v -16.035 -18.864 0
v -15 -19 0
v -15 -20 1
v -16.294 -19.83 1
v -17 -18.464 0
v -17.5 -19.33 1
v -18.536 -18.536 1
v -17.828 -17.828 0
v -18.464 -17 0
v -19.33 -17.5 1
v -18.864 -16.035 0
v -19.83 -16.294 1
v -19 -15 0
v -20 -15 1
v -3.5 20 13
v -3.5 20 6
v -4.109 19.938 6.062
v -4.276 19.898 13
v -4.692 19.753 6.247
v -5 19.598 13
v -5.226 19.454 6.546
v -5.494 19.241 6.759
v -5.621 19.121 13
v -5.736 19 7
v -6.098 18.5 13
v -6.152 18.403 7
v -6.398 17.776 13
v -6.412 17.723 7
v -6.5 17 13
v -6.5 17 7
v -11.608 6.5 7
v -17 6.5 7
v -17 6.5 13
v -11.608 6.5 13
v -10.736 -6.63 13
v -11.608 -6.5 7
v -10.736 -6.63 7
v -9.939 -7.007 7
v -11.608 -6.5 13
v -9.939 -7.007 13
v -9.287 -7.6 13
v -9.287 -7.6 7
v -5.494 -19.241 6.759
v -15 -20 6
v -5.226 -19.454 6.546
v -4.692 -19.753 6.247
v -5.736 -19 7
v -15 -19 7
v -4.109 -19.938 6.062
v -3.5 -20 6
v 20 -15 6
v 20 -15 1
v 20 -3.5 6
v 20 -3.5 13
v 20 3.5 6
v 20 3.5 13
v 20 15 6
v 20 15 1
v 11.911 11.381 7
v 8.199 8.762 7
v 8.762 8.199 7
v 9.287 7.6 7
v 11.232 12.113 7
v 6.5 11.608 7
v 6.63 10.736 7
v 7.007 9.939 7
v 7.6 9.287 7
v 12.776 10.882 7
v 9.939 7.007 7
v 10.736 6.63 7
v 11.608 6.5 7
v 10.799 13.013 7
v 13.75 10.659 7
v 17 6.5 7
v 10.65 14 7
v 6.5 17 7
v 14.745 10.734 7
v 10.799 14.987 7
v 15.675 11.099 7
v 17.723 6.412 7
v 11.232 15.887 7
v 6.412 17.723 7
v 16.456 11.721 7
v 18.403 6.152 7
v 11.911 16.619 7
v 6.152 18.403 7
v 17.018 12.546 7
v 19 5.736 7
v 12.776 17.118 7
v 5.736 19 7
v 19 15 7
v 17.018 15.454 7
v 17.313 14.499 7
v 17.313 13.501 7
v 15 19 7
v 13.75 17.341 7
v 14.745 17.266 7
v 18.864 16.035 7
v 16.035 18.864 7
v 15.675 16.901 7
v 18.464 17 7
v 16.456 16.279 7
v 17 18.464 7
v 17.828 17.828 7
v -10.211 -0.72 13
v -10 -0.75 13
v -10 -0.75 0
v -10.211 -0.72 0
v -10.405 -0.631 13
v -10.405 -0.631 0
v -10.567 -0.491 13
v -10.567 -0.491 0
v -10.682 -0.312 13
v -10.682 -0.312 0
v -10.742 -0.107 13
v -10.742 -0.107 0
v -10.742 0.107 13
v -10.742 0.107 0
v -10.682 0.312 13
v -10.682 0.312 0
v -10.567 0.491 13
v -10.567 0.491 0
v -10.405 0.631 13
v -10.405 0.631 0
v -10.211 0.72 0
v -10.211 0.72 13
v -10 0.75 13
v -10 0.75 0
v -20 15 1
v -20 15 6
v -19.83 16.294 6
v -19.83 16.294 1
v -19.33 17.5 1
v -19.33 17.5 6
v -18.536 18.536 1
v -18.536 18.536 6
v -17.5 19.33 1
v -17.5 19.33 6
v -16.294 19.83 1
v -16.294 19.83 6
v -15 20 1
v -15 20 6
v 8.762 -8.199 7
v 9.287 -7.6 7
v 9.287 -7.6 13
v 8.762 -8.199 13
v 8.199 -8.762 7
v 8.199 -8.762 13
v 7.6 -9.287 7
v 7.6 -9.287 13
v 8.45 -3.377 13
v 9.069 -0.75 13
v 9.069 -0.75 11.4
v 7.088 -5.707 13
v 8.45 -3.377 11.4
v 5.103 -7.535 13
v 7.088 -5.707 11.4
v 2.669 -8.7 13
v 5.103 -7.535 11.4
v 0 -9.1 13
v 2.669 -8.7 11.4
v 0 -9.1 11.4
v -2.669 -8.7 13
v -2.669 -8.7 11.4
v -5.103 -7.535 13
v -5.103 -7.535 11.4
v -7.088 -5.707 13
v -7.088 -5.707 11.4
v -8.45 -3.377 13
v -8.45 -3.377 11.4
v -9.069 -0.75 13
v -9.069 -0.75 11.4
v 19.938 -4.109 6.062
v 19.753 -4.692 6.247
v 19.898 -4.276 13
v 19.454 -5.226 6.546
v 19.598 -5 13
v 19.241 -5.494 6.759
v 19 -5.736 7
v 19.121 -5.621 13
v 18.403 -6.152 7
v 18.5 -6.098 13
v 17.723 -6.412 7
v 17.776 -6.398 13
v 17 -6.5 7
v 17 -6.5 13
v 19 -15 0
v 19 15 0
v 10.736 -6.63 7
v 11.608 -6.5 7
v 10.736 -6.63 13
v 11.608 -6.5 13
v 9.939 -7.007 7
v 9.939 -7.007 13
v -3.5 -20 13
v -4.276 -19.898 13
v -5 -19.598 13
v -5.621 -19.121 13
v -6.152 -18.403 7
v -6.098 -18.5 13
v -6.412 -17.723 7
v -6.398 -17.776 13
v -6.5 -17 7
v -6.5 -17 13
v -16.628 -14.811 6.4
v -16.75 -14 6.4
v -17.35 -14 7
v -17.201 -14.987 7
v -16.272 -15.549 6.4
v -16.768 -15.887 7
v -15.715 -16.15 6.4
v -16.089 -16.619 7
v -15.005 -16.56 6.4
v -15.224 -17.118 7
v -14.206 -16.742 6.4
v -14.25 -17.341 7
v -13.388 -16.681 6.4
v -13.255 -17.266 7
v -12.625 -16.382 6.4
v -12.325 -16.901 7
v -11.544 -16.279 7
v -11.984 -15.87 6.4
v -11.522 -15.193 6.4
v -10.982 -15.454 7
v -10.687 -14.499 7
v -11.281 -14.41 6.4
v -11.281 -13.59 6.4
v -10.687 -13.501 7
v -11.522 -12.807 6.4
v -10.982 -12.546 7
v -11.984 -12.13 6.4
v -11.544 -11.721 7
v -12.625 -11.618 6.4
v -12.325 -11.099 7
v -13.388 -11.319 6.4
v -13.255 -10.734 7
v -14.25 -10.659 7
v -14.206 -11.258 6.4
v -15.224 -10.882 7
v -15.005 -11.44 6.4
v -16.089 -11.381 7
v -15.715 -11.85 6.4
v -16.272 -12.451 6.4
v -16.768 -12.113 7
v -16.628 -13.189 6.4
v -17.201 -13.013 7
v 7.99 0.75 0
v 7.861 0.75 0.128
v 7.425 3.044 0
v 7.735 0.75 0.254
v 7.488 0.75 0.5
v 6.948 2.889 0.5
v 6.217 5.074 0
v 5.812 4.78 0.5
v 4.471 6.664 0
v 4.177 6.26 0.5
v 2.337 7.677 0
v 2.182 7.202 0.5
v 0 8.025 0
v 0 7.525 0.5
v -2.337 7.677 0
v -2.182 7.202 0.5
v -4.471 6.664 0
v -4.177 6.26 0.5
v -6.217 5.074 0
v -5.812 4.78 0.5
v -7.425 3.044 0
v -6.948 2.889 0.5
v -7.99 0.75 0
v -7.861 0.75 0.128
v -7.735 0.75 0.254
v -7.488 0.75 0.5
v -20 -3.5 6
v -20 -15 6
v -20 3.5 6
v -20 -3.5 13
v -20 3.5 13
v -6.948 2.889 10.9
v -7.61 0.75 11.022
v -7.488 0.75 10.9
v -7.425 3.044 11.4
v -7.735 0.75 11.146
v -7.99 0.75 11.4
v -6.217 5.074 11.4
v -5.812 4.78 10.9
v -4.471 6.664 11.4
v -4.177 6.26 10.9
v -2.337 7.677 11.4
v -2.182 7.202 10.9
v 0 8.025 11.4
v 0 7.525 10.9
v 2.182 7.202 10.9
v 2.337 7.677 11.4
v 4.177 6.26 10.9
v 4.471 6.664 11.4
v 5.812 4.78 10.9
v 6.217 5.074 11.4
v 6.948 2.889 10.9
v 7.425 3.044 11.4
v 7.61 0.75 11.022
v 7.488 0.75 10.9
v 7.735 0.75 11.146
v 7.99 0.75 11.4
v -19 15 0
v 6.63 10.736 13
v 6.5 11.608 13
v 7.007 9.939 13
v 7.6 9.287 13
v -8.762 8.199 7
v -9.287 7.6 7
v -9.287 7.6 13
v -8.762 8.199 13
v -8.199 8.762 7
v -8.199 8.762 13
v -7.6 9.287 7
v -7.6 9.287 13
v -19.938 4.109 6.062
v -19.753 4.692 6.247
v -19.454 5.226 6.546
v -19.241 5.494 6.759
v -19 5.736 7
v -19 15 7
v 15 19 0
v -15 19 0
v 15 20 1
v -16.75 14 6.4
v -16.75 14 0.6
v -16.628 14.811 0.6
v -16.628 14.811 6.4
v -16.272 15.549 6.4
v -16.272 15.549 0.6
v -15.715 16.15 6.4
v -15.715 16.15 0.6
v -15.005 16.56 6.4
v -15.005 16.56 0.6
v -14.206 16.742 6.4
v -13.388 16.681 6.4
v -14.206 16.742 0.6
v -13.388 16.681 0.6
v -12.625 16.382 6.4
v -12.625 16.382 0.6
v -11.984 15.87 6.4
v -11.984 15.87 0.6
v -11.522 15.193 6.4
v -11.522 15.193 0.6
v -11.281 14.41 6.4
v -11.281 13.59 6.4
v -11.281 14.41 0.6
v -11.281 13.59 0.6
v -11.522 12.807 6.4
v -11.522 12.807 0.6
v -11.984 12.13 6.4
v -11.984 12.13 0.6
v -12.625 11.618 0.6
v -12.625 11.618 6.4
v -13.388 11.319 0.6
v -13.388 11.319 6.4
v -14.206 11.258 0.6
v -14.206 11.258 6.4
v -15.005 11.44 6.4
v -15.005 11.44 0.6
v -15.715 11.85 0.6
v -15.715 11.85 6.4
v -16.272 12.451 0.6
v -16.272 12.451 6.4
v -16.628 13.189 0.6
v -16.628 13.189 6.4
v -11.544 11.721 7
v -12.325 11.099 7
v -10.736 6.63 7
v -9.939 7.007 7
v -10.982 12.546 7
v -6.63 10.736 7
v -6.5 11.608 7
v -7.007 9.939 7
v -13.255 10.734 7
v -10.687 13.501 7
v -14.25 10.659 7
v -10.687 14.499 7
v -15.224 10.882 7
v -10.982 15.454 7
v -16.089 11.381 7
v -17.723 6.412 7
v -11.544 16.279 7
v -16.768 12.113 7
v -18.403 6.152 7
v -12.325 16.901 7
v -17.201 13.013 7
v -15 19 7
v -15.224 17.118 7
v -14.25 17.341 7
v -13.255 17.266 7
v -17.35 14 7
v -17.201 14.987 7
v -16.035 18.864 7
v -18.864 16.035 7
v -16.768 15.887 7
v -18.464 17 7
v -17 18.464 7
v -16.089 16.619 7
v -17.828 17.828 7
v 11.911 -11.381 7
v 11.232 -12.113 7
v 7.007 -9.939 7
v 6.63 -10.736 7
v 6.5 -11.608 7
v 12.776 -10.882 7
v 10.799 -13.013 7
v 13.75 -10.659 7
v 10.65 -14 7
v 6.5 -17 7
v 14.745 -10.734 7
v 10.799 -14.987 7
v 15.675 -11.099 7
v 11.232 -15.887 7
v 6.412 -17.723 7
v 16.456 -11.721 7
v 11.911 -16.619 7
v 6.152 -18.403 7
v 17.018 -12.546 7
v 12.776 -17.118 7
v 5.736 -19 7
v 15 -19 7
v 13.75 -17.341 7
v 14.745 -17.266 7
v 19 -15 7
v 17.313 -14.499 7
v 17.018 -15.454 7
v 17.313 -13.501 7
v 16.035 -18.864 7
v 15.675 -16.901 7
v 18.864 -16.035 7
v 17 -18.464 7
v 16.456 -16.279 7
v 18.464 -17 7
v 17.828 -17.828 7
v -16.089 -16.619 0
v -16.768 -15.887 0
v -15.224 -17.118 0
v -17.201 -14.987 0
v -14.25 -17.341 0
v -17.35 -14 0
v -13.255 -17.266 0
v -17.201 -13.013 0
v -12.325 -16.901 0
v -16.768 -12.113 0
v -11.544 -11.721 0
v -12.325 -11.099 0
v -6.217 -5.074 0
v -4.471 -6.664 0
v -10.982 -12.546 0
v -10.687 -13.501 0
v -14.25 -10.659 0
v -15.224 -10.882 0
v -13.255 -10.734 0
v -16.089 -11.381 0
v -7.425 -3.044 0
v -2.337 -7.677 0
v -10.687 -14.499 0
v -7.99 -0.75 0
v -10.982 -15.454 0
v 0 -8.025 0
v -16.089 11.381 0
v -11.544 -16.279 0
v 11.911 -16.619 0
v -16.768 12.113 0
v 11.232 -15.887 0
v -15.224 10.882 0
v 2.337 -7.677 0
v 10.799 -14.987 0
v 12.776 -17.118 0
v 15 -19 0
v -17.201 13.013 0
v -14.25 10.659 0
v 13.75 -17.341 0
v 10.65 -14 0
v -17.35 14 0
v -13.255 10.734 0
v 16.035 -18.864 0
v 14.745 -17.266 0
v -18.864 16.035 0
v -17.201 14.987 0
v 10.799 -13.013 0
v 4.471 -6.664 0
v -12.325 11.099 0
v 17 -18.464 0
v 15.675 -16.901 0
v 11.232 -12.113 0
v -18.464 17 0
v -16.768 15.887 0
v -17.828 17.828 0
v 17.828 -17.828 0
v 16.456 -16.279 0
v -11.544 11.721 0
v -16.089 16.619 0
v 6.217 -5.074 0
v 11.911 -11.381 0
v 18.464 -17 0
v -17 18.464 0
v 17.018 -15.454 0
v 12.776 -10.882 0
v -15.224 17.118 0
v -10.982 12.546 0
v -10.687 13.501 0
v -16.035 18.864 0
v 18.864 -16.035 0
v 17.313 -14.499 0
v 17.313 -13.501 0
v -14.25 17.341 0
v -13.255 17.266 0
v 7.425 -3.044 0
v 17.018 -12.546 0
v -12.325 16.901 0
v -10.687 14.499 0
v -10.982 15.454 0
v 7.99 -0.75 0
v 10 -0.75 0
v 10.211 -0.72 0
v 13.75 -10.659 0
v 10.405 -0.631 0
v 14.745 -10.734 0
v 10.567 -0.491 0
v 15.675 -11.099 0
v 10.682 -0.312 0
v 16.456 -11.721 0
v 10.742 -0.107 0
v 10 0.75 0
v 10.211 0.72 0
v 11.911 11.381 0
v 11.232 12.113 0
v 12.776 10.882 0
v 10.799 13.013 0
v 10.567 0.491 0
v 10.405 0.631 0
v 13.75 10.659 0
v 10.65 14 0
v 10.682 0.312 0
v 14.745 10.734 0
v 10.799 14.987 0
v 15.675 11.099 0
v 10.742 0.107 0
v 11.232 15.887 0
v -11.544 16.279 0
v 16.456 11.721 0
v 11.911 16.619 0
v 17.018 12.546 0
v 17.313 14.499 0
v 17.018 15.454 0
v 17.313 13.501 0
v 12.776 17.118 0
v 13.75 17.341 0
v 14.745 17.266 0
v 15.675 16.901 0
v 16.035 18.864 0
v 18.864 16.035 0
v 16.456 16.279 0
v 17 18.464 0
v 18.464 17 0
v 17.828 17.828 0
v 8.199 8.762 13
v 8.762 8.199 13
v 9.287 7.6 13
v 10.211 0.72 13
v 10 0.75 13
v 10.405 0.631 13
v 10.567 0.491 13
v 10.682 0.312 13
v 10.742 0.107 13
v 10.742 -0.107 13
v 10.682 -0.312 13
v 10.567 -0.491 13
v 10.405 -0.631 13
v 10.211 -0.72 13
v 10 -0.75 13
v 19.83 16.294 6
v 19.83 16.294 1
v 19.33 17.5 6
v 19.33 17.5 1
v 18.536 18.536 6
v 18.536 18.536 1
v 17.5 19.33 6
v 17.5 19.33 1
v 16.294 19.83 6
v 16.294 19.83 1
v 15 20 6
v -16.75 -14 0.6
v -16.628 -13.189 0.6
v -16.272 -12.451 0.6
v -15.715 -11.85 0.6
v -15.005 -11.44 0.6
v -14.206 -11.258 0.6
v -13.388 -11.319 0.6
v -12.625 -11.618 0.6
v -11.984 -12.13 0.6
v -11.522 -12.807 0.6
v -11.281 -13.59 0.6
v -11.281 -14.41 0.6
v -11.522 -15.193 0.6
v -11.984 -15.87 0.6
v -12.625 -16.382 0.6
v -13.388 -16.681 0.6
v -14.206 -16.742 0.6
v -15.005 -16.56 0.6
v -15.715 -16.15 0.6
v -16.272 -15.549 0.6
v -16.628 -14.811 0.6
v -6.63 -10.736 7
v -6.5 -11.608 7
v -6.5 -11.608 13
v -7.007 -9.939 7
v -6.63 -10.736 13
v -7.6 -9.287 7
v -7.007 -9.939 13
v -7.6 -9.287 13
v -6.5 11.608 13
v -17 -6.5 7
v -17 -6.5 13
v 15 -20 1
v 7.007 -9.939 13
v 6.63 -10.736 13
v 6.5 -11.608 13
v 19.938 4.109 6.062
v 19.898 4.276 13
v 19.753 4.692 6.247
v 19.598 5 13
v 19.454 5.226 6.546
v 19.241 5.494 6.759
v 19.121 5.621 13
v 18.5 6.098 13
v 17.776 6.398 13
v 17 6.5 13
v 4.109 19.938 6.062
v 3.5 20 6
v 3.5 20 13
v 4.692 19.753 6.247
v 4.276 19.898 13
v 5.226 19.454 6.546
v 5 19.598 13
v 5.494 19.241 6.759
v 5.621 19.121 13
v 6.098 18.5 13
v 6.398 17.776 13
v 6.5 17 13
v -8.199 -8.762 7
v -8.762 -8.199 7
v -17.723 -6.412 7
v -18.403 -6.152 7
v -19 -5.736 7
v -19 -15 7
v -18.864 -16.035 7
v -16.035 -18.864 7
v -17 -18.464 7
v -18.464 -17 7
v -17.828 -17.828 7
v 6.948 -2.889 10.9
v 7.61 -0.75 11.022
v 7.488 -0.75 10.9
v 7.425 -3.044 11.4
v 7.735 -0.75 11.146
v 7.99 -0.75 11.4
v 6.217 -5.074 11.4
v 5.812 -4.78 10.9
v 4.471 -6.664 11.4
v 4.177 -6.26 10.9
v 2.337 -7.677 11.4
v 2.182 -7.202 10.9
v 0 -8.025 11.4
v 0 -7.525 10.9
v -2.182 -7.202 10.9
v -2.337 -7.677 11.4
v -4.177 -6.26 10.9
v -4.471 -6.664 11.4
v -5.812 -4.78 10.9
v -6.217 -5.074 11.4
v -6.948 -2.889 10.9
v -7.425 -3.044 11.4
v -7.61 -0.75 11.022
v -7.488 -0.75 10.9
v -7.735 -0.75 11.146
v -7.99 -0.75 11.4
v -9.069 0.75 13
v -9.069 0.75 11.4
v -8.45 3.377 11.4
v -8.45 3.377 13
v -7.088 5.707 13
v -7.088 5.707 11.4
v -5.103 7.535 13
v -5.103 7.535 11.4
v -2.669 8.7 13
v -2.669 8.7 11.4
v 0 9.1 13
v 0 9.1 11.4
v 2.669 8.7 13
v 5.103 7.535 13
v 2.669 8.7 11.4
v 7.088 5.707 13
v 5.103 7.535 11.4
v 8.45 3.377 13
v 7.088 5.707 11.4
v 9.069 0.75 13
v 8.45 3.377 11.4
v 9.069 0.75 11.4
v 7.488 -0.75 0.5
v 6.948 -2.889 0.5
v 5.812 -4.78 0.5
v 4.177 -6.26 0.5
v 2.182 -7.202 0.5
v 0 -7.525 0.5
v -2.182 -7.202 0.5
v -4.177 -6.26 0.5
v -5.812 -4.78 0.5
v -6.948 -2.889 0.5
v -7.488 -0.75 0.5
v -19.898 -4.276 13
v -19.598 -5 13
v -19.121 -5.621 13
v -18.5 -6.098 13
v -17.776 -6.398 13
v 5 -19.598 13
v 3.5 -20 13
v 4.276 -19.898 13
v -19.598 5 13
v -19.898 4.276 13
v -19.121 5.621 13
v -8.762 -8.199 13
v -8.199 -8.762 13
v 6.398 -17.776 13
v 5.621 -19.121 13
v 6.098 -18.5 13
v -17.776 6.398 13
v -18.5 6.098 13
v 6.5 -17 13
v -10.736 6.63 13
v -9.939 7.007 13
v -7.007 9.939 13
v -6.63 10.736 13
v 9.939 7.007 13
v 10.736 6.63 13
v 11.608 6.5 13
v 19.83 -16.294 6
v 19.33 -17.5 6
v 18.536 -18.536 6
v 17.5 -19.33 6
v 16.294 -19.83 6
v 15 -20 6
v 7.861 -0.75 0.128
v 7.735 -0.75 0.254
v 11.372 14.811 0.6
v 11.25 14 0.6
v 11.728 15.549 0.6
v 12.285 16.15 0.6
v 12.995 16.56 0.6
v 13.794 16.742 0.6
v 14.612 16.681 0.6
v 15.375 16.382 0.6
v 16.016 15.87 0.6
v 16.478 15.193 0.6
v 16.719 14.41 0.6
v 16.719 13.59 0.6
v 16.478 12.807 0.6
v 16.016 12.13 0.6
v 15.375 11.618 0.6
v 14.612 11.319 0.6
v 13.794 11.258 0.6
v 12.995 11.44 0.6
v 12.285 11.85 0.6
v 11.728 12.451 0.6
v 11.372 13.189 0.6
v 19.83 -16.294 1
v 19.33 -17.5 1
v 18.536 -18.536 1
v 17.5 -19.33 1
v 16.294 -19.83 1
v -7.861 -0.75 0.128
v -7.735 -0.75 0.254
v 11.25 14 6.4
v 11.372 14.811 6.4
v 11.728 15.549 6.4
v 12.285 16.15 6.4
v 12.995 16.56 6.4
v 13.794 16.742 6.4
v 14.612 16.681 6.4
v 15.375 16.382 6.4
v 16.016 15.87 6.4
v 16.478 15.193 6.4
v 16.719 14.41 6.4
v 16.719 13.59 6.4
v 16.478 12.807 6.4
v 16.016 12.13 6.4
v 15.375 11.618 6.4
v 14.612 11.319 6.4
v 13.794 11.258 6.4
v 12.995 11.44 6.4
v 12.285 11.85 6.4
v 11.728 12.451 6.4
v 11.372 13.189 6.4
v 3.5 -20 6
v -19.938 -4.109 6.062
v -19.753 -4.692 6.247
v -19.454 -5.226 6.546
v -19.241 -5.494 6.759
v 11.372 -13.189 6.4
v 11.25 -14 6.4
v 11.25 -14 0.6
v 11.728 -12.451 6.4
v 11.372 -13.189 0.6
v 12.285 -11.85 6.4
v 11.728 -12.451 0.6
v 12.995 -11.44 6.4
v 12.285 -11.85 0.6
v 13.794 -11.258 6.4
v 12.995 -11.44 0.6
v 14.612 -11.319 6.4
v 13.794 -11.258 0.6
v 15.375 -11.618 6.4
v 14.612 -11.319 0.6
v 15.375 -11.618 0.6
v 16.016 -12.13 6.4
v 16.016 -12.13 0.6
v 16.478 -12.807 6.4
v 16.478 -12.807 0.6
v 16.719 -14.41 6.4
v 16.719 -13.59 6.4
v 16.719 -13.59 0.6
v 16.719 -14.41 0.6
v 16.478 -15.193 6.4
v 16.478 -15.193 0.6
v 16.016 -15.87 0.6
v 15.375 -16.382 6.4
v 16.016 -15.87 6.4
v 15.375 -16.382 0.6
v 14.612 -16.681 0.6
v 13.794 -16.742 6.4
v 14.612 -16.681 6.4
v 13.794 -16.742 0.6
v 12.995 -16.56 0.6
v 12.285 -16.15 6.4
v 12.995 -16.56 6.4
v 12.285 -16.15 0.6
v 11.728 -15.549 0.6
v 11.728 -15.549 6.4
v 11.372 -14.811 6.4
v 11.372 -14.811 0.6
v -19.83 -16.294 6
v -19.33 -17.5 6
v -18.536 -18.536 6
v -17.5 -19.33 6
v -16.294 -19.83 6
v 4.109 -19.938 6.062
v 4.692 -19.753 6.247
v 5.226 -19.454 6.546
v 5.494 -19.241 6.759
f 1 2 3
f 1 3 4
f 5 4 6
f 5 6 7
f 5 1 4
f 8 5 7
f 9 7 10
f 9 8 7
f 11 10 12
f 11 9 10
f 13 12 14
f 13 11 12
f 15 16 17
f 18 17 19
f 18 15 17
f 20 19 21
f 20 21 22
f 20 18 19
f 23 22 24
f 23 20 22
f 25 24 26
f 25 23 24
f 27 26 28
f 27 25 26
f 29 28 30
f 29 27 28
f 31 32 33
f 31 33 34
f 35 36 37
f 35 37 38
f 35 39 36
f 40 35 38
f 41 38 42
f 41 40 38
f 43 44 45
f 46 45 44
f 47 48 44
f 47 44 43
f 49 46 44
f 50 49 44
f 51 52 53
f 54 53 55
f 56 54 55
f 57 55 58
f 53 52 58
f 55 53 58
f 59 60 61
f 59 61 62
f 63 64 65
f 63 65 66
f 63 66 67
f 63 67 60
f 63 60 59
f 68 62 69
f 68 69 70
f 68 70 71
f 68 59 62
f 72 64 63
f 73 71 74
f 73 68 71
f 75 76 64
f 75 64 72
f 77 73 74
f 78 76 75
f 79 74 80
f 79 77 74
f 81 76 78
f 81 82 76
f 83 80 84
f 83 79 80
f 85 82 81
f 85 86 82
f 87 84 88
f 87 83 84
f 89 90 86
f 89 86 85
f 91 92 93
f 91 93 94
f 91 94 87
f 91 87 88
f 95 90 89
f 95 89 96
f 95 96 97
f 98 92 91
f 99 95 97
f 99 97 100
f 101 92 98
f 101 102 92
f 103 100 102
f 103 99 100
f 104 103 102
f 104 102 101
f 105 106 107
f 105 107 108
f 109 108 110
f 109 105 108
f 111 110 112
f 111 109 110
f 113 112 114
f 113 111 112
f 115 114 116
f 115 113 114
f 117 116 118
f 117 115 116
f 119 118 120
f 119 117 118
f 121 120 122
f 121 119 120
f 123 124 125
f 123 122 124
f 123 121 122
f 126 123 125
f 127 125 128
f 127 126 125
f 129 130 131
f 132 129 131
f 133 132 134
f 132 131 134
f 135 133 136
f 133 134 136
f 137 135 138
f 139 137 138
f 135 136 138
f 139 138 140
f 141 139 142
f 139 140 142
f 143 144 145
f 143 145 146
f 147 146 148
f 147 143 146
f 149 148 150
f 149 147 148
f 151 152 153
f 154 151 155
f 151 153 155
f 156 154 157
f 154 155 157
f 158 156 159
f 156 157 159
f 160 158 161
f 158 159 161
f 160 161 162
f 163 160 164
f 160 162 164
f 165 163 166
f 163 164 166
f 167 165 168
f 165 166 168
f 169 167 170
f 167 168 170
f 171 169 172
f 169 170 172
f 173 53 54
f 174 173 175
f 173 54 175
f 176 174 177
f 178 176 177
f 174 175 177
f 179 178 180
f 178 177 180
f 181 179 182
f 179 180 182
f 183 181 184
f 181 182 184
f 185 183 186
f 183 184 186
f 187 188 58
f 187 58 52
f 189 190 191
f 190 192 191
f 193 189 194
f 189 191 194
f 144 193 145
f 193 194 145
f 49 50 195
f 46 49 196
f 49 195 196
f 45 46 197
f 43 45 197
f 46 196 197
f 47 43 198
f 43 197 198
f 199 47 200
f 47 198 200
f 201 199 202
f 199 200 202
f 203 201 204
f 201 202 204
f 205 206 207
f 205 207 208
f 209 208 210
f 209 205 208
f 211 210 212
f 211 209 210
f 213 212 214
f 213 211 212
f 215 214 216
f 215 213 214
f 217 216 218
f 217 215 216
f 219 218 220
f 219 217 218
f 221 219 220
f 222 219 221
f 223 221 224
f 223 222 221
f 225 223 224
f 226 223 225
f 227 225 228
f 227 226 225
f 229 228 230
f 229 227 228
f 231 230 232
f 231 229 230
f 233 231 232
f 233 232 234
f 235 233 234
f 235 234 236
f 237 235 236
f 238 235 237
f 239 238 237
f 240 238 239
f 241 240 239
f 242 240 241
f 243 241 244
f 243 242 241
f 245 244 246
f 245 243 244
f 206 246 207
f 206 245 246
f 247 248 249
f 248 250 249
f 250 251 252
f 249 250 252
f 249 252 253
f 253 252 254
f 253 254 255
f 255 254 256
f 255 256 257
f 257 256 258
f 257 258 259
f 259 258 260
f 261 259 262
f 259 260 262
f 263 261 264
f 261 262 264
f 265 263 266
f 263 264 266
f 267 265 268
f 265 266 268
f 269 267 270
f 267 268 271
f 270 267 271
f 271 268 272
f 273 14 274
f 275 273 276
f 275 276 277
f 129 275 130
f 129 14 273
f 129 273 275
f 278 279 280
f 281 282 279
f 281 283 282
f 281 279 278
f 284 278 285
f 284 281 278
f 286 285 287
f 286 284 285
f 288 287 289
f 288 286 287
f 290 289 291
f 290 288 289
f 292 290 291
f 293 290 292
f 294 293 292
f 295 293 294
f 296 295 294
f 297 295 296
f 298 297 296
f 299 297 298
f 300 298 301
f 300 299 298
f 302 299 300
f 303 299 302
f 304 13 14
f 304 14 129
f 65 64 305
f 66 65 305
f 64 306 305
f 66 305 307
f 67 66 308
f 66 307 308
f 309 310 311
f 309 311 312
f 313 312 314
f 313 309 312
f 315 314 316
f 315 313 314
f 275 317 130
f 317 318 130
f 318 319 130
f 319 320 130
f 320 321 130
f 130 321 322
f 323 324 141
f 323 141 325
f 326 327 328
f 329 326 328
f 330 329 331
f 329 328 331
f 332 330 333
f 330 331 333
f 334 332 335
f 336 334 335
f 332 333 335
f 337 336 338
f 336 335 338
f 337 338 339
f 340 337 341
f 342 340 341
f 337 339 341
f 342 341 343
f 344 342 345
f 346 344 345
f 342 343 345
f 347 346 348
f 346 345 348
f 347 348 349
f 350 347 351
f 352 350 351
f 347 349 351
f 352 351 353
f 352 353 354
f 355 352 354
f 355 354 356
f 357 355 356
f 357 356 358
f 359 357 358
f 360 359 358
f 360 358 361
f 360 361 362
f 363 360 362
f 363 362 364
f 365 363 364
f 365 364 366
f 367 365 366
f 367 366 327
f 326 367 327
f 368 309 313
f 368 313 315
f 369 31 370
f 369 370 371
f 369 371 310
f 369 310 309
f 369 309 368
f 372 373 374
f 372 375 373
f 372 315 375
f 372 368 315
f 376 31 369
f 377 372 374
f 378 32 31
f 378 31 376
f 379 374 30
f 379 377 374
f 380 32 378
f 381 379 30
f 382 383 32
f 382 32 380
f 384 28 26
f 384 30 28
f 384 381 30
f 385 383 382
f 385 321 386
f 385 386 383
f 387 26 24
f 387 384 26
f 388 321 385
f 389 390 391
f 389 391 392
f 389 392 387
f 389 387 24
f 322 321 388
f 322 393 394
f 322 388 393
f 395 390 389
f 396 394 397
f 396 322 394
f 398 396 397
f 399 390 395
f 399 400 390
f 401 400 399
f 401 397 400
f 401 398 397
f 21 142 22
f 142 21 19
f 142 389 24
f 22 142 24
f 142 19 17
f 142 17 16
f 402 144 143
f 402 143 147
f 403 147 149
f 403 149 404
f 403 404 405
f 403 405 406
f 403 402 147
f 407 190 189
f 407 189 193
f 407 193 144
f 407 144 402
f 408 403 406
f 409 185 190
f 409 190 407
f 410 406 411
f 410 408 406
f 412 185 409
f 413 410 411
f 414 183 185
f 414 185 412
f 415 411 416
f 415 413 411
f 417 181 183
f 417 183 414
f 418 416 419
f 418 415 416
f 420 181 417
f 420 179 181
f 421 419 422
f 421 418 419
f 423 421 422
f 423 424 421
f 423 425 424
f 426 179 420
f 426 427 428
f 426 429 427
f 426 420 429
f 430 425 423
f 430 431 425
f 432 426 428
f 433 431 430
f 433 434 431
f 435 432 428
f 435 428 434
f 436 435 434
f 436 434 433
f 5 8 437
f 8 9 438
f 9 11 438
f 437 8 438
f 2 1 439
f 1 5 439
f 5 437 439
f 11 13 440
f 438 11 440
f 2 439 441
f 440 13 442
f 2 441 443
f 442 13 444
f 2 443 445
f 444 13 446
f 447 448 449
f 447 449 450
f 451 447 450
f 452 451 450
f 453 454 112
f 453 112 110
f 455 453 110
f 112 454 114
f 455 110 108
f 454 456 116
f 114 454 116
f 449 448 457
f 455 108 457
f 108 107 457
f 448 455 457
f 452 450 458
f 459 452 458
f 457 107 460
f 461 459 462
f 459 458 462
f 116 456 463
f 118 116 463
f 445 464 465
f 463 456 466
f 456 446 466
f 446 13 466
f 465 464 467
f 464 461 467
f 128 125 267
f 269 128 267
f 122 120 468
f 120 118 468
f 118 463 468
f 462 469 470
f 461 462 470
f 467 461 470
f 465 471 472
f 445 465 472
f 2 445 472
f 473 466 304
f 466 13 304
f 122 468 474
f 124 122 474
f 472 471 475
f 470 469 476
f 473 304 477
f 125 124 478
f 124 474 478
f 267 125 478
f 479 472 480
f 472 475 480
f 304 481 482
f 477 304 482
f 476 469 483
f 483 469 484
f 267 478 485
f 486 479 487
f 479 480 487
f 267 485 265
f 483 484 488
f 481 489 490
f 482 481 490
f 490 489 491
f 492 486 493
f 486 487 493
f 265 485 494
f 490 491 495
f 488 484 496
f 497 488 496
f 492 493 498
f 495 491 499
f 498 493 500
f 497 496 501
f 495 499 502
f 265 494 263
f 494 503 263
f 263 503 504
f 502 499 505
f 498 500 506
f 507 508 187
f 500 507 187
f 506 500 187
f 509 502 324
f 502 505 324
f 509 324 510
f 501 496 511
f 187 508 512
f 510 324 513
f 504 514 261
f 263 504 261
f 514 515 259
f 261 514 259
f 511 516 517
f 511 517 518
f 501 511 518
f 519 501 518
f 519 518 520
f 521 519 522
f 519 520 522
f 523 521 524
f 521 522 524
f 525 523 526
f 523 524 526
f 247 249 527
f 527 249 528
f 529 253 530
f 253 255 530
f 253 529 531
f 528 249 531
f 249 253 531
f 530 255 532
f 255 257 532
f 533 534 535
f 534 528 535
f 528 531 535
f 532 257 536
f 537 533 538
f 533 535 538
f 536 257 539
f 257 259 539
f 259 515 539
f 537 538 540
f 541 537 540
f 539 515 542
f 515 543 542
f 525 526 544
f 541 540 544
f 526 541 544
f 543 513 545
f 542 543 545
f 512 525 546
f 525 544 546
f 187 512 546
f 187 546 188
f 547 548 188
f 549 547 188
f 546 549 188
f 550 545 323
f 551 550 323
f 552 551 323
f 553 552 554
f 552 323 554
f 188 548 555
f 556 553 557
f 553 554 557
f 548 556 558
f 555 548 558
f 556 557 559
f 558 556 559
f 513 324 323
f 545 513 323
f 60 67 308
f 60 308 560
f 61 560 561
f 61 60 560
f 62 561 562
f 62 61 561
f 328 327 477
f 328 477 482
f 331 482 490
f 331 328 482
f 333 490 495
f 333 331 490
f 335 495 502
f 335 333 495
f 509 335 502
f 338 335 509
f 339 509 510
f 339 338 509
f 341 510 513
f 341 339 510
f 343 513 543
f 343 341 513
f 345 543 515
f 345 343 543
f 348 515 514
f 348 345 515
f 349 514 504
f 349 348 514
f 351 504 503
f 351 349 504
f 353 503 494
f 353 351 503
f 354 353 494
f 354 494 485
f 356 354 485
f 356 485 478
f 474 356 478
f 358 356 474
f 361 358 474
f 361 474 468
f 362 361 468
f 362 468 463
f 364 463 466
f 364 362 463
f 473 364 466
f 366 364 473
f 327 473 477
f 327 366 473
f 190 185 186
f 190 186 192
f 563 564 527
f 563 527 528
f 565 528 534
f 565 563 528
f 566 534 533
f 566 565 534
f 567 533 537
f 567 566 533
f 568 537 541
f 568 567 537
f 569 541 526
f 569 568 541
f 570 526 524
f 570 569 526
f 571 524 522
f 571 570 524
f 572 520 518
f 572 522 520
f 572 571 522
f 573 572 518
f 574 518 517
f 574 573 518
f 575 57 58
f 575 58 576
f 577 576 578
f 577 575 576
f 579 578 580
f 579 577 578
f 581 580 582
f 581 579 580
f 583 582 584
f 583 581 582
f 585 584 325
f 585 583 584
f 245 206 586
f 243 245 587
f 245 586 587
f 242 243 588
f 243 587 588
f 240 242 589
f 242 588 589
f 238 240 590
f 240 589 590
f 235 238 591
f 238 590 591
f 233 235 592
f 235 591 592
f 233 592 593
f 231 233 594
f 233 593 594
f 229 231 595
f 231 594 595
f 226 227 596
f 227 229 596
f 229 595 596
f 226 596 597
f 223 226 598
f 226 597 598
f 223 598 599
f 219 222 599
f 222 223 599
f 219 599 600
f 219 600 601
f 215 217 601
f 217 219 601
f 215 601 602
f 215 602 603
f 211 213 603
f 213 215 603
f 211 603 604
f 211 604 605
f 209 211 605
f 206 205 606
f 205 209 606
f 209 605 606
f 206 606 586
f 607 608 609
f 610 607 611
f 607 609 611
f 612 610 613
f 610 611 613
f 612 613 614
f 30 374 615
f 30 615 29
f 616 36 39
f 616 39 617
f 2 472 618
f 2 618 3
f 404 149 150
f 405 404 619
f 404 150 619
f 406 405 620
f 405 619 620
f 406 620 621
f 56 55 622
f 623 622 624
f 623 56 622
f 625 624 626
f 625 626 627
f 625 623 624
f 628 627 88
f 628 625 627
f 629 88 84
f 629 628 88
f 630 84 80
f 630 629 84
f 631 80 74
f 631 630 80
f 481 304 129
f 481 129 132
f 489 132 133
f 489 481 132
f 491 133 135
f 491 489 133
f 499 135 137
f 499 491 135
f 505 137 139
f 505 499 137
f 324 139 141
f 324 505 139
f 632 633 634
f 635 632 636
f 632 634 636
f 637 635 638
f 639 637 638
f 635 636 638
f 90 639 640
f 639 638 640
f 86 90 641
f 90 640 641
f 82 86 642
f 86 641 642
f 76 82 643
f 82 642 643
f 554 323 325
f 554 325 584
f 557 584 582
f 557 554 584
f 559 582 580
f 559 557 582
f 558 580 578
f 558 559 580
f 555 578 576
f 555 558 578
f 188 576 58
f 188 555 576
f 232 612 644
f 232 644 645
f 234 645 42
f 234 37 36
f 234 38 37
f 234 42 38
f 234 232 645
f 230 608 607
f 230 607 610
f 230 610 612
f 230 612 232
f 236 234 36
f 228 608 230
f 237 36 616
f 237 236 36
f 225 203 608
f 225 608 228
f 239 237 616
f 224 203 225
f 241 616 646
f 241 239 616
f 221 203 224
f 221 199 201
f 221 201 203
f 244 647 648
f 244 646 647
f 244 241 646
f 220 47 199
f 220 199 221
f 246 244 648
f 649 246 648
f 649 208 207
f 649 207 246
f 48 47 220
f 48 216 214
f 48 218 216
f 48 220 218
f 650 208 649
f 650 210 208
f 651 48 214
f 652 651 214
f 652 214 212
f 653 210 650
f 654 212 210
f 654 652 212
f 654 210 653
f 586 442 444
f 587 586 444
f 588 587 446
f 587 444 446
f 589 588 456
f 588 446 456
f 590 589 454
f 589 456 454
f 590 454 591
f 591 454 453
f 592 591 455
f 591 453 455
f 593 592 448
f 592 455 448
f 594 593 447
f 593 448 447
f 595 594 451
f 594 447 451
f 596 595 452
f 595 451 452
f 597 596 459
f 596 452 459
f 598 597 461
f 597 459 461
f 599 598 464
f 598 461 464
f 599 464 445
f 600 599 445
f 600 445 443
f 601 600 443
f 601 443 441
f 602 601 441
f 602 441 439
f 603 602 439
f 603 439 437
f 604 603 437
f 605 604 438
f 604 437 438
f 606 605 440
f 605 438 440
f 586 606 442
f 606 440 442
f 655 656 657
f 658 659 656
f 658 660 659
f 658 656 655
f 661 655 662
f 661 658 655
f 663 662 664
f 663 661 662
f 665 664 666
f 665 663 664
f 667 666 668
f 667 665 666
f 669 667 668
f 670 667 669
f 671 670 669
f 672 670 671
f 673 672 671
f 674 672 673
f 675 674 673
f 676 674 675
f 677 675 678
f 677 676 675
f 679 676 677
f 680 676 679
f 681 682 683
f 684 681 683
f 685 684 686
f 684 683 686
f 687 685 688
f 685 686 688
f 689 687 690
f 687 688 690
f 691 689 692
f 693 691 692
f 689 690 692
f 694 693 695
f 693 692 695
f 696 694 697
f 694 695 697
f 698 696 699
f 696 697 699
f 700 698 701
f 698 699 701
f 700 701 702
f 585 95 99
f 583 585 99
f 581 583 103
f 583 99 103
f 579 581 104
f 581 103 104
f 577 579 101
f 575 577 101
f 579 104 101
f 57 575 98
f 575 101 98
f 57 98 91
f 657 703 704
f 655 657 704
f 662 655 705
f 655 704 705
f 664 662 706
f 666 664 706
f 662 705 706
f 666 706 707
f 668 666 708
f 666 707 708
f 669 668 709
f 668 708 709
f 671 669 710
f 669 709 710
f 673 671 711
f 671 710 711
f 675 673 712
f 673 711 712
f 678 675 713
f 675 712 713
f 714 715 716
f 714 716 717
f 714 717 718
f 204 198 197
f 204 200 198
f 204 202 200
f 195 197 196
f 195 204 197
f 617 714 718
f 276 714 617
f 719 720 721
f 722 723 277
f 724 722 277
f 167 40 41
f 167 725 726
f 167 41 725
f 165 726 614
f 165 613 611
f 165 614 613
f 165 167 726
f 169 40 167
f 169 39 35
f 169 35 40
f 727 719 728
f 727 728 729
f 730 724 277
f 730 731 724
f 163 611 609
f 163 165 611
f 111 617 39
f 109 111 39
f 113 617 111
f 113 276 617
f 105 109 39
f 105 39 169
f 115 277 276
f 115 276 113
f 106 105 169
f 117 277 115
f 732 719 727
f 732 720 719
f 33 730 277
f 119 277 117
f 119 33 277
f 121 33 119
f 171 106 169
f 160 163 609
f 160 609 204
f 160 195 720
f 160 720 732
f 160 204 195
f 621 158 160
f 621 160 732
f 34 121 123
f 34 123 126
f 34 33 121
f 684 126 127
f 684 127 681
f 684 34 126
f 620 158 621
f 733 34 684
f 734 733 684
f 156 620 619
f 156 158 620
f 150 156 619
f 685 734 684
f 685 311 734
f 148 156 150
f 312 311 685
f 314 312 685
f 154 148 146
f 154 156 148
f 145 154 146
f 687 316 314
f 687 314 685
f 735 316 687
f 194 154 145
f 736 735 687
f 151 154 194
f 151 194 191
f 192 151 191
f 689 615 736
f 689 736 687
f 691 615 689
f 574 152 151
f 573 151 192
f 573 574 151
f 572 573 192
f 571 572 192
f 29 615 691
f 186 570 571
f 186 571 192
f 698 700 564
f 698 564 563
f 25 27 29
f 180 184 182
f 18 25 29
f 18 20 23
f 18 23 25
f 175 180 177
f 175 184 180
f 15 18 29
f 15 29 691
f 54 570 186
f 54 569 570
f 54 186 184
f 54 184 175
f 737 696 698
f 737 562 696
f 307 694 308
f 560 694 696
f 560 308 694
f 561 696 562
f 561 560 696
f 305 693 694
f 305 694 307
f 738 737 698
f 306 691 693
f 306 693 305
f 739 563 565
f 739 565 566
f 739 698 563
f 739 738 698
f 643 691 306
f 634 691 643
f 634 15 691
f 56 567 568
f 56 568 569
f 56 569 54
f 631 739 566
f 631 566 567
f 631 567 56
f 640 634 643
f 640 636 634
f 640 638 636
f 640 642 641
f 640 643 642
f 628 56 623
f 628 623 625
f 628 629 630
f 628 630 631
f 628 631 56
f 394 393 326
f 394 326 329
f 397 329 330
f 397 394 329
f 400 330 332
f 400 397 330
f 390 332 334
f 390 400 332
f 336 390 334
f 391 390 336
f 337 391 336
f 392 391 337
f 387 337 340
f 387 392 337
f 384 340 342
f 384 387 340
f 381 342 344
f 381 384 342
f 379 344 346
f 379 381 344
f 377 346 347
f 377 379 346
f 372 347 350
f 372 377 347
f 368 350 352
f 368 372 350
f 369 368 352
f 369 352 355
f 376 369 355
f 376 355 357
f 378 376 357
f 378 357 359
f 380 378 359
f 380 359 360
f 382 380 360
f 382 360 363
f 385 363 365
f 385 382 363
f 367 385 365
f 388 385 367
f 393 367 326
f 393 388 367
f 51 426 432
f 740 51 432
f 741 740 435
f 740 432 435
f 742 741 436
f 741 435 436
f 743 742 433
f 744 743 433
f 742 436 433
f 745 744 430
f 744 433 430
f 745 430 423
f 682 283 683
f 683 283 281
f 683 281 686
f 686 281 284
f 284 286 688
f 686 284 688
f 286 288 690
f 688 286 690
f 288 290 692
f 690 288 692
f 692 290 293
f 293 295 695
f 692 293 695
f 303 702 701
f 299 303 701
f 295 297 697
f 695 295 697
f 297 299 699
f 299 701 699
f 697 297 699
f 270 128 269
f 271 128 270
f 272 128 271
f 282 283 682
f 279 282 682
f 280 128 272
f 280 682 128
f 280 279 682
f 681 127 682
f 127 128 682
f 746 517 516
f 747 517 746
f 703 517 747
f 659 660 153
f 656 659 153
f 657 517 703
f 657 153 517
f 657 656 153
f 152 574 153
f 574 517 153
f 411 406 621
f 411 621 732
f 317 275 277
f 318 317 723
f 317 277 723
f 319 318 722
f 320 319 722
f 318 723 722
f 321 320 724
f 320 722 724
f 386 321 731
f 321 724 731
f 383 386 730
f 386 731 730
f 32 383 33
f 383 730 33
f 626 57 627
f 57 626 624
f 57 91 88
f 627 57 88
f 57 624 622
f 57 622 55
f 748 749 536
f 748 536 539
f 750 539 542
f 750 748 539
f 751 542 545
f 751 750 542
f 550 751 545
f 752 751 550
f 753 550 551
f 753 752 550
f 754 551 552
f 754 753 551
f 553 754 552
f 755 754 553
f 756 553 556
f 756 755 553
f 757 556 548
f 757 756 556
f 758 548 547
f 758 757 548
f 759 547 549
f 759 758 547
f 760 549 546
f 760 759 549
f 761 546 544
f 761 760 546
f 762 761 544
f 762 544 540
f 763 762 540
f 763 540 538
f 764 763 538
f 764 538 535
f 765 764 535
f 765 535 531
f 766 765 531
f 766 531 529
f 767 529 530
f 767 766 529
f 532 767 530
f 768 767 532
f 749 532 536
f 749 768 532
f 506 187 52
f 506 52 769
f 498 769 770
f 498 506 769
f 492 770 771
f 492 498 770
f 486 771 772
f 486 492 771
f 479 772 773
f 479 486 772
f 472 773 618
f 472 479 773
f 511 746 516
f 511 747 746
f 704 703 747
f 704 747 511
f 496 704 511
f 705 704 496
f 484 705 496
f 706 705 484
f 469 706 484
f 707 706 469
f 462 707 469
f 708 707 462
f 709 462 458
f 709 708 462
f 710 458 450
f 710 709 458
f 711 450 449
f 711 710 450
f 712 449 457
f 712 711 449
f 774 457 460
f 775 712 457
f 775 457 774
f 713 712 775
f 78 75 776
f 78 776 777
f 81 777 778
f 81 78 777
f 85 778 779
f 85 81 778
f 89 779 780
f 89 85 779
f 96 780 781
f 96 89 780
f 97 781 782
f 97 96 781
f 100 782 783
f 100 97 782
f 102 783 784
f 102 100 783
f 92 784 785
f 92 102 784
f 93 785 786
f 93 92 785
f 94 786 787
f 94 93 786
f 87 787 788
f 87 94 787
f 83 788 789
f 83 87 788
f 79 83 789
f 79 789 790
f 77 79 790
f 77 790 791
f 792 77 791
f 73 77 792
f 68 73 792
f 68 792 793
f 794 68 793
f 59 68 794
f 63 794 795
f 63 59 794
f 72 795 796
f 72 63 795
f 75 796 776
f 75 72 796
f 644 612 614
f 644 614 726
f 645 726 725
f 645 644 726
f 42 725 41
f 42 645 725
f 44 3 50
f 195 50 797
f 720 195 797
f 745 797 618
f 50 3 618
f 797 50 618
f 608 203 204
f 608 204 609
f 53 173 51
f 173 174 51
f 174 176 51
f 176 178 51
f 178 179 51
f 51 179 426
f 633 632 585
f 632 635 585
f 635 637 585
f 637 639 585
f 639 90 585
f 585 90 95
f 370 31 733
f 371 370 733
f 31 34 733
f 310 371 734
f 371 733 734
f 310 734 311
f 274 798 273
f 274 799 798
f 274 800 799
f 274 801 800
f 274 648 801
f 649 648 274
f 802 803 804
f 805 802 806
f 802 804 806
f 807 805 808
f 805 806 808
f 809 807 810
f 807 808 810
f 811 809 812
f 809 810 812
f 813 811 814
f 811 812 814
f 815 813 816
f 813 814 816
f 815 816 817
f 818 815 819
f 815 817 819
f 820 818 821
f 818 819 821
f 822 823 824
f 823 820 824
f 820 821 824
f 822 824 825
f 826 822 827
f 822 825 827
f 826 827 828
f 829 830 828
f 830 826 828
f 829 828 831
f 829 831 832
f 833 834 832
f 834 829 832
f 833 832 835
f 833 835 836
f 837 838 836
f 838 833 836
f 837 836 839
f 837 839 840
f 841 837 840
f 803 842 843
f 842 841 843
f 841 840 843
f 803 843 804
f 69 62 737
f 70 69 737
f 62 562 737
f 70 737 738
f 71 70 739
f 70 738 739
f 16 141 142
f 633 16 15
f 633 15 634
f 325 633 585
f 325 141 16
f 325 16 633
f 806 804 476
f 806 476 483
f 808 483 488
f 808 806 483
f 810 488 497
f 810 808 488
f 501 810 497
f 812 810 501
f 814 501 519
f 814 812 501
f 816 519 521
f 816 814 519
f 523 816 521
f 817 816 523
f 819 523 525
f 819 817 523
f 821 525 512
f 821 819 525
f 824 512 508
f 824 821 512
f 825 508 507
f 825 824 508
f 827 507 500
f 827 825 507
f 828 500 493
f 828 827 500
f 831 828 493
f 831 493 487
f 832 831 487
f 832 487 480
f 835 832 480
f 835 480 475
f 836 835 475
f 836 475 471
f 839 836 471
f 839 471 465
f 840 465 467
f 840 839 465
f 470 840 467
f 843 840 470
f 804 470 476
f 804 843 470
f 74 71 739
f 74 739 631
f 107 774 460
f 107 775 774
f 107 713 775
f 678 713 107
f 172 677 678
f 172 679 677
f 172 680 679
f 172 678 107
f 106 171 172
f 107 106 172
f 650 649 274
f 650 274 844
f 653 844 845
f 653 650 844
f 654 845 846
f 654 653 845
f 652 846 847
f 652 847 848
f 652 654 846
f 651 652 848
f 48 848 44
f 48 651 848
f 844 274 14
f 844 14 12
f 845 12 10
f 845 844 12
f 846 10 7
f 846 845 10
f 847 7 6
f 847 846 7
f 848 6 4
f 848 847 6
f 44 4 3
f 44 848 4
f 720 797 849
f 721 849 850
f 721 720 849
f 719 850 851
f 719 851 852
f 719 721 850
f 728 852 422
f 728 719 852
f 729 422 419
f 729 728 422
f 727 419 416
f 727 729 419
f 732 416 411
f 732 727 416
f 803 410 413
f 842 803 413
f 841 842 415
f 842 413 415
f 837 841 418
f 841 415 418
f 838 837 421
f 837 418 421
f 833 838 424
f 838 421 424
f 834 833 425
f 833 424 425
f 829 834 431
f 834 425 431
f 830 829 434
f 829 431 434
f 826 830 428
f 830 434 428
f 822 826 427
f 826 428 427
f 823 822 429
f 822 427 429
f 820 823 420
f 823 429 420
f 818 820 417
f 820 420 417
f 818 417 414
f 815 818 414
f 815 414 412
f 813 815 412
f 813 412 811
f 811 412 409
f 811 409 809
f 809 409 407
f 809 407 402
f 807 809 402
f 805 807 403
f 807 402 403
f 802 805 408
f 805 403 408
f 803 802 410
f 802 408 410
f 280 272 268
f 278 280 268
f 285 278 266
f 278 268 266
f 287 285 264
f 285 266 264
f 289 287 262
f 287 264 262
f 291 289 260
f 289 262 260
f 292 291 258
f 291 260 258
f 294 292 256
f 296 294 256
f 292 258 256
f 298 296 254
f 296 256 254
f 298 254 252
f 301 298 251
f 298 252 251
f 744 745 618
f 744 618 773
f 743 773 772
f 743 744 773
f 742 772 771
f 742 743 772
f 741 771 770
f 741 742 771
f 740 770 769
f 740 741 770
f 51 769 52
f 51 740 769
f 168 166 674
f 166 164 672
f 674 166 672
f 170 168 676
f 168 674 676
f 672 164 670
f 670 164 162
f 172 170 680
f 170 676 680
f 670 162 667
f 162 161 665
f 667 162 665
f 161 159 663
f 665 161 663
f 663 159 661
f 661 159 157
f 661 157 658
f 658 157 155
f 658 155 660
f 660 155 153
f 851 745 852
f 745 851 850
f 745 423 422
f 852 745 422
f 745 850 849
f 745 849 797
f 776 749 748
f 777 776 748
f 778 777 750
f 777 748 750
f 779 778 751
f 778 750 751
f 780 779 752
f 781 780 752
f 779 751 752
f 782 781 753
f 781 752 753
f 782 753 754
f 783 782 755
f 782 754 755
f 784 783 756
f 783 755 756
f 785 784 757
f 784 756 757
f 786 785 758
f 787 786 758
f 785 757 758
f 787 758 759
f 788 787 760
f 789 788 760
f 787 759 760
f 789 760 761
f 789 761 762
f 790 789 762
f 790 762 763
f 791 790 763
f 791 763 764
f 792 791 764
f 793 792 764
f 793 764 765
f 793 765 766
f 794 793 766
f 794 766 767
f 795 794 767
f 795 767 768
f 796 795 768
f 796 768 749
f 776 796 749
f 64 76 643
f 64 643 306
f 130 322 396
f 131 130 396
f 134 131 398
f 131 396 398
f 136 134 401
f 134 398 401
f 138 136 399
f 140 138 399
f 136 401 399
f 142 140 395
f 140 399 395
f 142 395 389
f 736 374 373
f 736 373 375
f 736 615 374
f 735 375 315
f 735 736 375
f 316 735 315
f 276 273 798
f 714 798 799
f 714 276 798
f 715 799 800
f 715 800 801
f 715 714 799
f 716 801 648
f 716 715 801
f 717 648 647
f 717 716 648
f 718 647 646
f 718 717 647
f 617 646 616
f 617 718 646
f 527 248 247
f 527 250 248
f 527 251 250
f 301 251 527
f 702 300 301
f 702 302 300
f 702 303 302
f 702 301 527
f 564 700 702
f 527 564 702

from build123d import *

# Parameters (mm, degrees)
SZKIC1_W                    = 40
SZKIC1_H                    = 40
DODANIE_WYCI_GNI_CIE1_DEPTH = 13
OTW_R_POD_RUB_M51_D         = 5.5
SZKIC4_R                    = 6.05
WYTNIJ_WYCI_GNI_CIE1_DEPTH  = 32.128764833
WYTNIJ_WYCI_GNI_CIE2_START  = -6
SZKIC5_R                    = 2.75
WYTNIJ_WYCI_GNI_CIE2_DEPTH  = 6
SZYK_KO_OWY1_COUNT          = 4
ZAOKR_GLENIE1_R             = 5
ZAOKR_GLENIE2_R             = 3
SFAZOWANIE2_SIZE            = 1
SFAZOWANIE3_SIZE            = 0.6
SFAZOWANIE4_SIZE            = 0.5


with BuildPart() as part:
    # Szkic1 → Dodanie-wyciągnięcie1 (new body)
    with BuildSketch(Plane.XY):
        Rectangle(SZKIC1_W, SZKIC1_H)
    extrude(amount=DODANIE_WYCI_GNI_CIE1_DEPTH)

    # Otwór pod śrubę M51 (through all)
    with Locations(Plane.XY.offset(13)):
        with Locations((-14, 14), (14, 14), (14, -14), (-14, -14)):
            Hole(OTW_R_POD_RUB_M51_D / 2)

    # Szkic4 → Wytnij-wyciągnięcie1 (cut, through all)
    with BuildSketch(Plane.XY.offset(13)):
        Circle(SZKIC4_R)
        with BuildLine():
            Line((-10, 0.75), (10, 0.75))
            ThreePointArc((10, 0.75), (10.75, 0), (10, -0.75))
            Line((10, -0.75), (-10, -0.75))
            ThreePointArc((-10, -0.75), (-10.75, 0), (-10, 0.75))
        make_face()
    extrude(amount=-WYTNIJ_WYCI_GNI_CIE1_DEPTH, mode=Mode.SUBTRACT)

    # Szkic5 → Wytnij-wyciągnięcie2 (cut)
    with BuildSketch(Plane.XY.offset(13).offset(WYTNIJ_WYCI_GNI_CIE2_START)):
        with BuildLine():
            Line((6.5, 20), (6.5, 10.087120501))
            ThreePointArc((6.5, 10.087120501), (8.485281374, 8.485281374), (10.087120501, 6.5))
            Line((10.087120501, 6.5), (20, 6.5))
            Line((20, 6.5), (20, 20))
            Line((20, 20), (6.5, 20))
        make_face()
        with Locations((14, 14)):
            Circle(SZKIC5_R, mode=Mode.SUBTRACT)
    wytnij_wyci_gni_cie2 = extrude(amount=WYTNIJ_WYCI_GNI_CIE2_DEPTH, mode=Mode.SUBTRACT)

    # Szyk kołowy1: Wytnij-wyciągnięcie2 ×4 about axis
    szyk_ko_owy1_axis = Axis((0, 0, 0), (0, 0, 1))
    for i in range(1, SZYK_KO_OWY1_COUNT):
        add(wytnij_wyci_gni_cie2.rotate(szyk_ko_owy1_axis, i * 360 / SZYK_KO_OWY1_COUNT), mode=Mode.SUBTRACT)

    # Zaokrąglenie1
    zaokr_glenie1_edges = [part.edges().sort_by_distance(p)[0] for p in [
        (20, 20, 3.5),
        (20, -20, 3.5),
        (-20, -20, 3.5),
        (-20, 20, 3.5),
    ]]
    fillet(zaokr_glenie1_edges, radius=ZAOKR_GLENIE1_R)

    # Zaokrąglenie2
    zaokr_glenie2_edges = [part.edges().sort_by_distance(p)[0] for p in [
        (-10.087120501, -6.5, 10),
        (-6.5, -10.087120501, 10),
        (-6.5, -20, 10),
        (-20, -6.5, 10),
        (-6.5, 10.087120501, 10),
        (-10.087120501, 6.5, 10),
        (-20, 6.5, 10),
        (-6.5, 20, 10),
        (10.087120501, 6.5, 10),
        (6.5, 10.087120501, 10),
        (6.5, 20, 10),
        (20, 6.5, 10),
        (6.5, -10.087120501, 10),
        (10.087120501, -6.5, 10),
        (20, -6.5, 10),
        (6.5, -20, 10),
    ]]
    fillet(zaokr_glenie2_edges, radius=ZAOKR_GLENIE2_R)

    # Sfazowanie2
    sfazowanie2_edges = [part.edges().sort_by_distance(p)[0] for p in [
        (-9.25, -20, 7),
        (-20, 9.25, 7),
        (-20, 0, 0),
        (-20, -9.25, 7),
        (20, 0, 0),
        (0, -20, 0),
        (0, 20, 0),
        (18.535533906, 18.535533906, 0),
        (18.535533906, -18.535533906, 0),
        (-18.535533906, -18.535533906, 0),
        (-18.535533906, 18.535533906, 0),
        (-9.25, 20, 7),
        (-18.535533906, 18.535533906, 7),
        (9.25, -20, 7),
        (-18.535533906, -18.535533906, 7),
        (20, 9.25, 7),
        (18.535533906, -18.535533906, 7),
        (18.535533906, 18.535533906, 7),
        (9.25, 20, 7),
        (20, -9.25, 7),
    ]]
    chamfer(sfazowanie2_edges, length=SFAZOWANIE2_SIZE)

    # Sfazowanie3
    sfazowanie3_edges = [part.edges().sort_by_distance(p)[0] for p in [
        (-11.25, -14, 7),
        (-11.25, 14, 7),
        (-11.25, -14, 0),
        (16.75, -14, 0),
        (16.75, 14, 0),
        (-11.25, 14, 0),
        (16.75, 14, 7),
        (16.75, -14, 7),
    ]]
    chamfer(sfazowanie3_edges, length=SFAZOWANIE3_SIZE)

    # Szkic6 → Wycięcie-obrót1 (revolve, cut)
    with BuildSketch(Plane(origin=(0, 0, 0), x_dir=(0, 0, -1), z_dir=(1, 0, 0))):
        Polygon((-13, 9.1), (-11.4, 9.1), (-11.4, 7.525), (0, 7.525), (0, 0), (-13, 0), align=None)
    revolve(axis=Axis((0, 0, 0), (0, 0, -1)), mode=Mode.SUBTRACT)

    # Sfazowanie4
    sfazowanie4_edges = [part.edges().sort_by_distance(p)[0] for p in [
        (0, -7.525, 11.4),
        (0, -7.525, 0),
        (0, 7.525, 11.4),
        (0, 7.525, 0),
    ]]
    chamfer(sfazowanie4_edges, length=SFAZOWANIE4_SIZE)


solid = part.part
